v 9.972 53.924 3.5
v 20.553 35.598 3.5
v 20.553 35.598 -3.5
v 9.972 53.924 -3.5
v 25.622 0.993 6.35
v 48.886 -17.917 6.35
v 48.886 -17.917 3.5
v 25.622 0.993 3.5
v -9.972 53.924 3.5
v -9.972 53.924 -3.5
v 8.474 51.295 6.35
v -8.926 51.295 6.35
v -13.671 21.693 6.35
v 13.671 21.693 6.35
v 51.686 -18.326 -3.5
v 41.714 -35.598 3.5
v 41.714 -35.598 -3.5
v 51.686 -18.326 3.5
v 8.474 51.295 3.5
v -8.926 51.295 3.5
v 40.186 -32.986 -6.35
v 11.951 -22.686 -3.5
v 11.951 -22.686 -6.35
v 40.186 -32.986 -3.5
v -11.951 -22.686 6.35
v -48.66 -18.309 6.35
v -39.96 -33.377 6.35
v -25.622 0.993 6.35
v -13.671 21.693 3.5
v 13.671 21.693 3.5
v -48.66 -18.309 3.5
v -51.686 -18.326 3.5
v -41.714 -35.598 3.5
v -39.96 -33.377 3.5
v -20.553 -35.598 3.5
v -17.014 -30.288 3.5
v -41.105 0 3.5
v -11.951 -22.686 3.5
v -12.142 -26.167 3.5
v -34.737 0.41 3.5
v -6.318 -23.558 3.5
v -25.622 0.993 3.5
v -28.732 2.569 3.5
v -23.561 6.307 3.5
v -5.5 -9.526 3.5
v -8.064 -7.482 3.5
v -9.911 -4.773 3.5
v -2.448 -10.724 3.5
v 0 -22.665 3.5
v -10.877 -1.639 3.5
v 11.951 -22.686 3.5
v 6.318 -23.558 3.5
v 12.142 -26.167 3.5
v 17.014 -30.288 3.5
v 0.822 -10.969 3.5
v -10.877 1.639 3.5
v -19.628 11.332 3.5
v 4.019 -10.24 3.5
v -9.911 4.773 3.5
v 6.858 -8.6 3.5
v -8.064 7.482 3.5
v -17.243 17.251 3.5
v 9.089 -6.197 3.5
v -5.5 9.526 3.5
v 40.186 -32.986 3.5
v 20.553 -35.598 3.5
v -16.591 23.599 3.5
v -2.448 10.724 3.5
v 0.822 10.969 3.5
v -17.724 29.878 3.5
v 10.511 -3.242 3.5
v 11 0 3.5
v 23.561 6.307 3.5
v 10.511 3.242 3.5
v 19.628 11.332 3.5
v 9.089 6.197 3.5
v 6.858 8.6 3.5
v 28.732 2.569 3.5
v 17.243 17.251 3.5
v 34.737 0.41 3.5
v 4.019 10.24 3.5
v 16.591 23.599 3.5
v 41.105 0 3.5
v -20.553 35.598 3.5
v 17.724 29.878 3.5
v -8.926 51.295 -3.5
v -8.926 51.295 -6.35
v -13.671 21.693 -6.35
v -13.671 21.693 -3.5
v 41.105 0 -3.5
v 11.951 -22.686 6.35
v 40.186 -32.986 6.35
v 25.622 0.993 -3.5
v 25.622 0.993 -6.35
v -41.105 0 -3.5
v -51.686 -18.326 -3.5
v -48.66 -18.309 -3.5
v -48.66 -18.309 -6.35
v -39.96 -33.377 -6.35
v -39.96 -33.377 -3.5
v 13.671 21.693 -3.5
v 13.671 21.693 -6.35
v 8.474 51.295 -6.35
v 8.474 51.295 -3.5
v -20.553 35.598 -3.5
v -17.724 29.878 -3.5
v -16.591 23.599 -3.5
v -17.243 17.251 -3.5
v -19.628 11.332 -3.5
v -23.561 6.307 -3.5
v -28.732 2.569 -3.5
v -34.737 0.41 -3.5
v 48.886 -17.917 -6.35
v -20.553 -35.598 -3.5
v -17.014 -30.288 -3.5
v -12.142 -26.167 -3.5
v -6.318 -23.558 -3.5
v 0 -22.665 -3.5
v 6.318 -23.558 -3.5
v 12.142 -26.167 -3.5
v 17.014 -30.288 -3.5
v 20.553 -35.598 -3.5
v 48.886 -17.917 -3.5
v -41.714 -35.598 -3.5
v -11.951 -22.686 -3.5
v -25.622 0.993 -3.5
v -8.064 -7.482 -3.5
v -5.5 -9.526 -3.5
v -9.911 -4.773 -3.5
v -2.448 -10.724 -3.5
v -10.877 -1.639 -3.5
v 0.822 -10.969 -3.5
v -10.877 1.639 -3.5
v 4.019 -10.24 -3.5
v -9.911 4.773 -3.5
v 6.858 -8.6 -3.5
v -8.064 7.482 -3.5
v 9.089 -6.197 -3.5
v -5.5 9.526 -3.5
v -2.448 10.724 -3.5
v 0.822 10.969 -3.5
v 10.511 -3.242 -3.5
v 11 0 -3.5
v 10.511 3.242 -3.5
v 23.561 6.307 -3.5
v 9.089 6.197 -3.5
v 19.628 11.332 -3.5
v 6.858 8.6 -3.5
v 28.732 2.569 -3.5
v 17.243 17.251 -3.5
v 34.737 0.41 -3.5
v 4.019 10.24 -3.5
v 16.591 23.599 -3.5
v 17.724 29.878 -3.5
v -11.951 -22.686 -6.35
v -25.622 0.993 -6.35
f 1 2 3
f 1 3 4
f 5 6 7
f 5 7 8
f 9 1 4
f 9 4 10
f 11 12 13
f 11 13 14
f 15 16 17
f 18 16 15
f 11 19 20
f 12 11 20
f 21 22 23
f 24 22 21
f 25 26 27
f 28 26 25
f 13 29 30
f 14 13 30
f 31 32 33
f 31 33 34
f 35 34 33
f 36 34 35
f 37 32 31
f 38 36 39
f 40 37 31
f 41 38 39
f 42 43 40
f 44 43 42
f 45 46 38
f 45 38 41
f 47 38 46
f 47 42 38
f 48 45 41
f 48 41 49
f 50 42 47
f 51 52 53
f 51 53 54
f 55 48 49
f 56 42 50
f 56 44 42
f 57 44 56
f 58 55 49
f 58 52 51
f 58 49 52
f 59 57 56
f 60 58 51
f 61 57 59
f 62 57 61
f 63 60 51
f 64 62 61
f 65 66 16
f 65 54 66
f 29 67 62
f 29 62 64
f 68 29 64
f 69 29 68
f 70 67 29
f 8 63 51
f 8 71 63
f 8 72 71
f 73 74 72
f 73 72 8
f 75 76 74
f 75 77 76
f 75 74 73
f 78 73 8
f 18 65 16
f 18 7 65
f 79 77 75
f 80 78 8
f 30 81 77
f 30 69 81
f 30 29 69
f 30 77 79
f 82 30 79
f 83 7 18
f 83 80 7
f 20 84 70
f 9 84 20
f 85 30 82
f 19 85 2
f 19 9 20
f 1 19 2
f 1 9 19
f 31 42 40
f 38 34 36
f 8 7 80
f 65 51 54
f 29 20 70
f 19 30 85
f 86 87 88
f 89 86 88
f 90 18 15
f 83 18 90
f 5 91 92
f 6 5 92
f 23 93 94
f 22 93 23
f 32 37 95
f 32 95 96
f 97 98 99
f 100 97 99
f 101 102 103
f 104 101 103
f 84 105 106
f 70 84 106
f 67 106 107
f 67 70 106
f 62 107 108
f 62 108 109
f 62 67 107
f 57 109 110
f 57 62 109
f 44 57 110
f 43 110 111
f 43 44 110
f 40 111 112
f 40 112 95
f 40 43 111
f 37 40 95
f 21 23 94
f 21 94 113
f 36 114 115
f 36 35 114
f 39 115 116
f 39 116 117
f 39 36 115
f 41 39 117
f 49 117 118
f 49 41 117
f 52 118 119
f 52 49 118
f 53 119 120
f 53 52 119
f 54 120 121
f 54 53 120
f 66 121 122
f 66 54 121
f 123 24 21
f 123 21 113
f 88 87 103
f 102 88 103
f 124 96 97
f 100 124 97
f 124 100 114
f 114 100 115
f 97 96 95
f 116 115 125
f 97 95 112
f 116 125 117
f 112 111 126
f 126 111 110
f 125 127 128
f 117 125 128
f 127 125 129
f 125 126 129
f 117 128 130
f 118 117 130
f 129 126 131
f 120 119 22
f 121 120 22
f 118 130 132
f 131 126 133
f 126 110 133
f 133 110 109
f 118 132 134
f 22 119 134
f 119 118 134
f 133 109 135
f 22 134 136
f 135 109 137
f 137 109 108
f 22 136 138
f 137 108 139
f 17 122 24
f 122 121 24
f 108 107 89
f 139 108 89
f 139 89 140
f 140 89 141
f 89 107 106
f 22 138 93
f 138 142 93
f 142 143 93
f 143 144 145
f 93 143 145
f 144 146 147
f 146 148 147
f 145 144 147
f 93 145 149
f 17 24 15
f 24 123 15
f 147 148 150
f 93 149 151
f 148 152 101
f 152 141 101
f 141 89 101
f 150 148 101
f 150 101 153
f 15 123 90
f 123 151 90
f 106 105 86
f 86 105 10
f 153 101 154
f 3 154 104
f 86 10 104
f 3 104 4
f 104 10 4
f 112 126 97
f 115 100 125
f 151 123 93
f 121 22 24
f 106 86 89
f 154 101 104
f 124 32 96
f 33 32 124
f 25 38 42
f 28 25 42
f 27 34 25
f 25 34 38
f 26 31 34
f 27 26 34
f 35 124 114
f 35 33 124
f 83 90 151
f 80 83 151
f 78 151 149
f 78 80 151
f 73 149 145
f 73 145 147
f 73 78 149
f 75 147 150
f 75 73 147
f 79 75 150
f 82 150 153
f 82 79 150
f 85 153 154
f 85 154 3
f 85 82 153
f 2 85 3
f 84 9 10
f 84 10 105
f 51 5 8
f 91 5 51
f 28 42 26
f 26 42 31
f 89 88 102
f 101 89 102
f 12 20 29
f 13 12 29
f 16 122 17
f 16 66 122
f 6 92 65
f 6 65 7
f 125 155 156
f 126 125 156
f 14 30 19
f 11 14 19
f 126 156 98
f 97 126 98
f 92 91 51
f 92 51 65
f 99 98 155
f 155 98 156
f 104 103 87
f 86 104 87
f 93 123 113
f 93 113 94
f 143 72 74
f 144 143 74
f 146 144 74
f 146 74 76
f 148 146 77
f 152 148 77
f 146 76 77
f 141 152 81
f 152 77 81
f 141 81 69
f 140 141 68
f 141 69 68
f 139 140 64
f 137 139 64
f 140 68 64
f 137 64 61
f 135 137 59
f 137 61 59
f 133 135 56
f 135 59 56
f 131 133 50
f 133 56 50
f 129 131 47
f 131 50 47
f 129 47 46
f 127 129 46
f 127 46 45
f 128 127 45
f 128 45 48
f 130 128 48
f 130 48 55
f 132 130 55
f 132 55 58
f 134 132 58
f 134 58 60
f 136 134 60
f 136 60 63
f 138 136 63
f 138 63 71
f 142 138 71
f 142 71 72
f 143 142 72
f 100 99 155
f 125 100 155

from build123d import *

# Parameters (mm, degrees)
F1_DEPTH = 3.5
F2_R     = 11
F3_DEPTH = 63.5
F5_DEPTH = 6.35


with BuildPart() as f1:
    # F0 (on Top) → F1 (new body, symmetric)
    with BuildSketch(Plane.XY):
        with BuildLine():
            Line((20.552645, -35.598226), (41.713538, -35.598226))
            Line((41.713538, -35.598226), (51.685737, -18.325871))
            Line((51.685737, -18.325871), (41.105291, 0))
            ThreePointArc((41.105291, 0), (19.628403, 11.332464), (20.552645, 35.598226))
            Line((20.552645, 35.598226), (9.972199, 53.924097))
            Line((9.972199, 53.924097), (-9.972199, 53.924097))
            Line((-9.972199, 53.924097), (-20.552645, 35.598226))
            ThreePointArc((-20.552645, 35.598226), (-19.628403, 11.332464), (-41.105291, 0))
            Line((-41.105291, 0), (-51.685737, -18.325871))
            Line((-51.685737, -18.325871), (-41.713538, -35.598226))
            Line((-41.713538, -35.598226), (-20.552645, -35.598226))
            ThreePointArc((-20.552645, -35.598226), (0, -22.664928), (20.552645, -35.598226))
        make_face()
    extrude(amount=F1_DEPTH, both=True)

    # F2 (on face) → F3 (cut)
    with BuildSketch(Plane.XY.offset(3.5)):
        Circle(F2_R)
    extrude(amount=-F3_DEPTH, mode=Mode.SUBTRACT)

    # F4 (on Top) → F5 (join, symmetric)
    with BuildSketch(Plane.XY):
        Polygon((8.473816, 51.294833), (-8.925753, 51.294833), (-13.671091, 21.692971), (13.671093, 21.692971), align=None)
        Polygon((-11.951118, -22.685997), (-25.62221, 0.993028), (-48.659537, -18.308877), (-39.959752, -33.377345), align=None)
        Polygon((25.622209, 0.993027), (11.951117, -22.685999), (40.185721, -32.985957), (48.885505, -17.917488), align=None)
    extrude(amount=F5_DEPTH, both=True)


solid = f1.part
